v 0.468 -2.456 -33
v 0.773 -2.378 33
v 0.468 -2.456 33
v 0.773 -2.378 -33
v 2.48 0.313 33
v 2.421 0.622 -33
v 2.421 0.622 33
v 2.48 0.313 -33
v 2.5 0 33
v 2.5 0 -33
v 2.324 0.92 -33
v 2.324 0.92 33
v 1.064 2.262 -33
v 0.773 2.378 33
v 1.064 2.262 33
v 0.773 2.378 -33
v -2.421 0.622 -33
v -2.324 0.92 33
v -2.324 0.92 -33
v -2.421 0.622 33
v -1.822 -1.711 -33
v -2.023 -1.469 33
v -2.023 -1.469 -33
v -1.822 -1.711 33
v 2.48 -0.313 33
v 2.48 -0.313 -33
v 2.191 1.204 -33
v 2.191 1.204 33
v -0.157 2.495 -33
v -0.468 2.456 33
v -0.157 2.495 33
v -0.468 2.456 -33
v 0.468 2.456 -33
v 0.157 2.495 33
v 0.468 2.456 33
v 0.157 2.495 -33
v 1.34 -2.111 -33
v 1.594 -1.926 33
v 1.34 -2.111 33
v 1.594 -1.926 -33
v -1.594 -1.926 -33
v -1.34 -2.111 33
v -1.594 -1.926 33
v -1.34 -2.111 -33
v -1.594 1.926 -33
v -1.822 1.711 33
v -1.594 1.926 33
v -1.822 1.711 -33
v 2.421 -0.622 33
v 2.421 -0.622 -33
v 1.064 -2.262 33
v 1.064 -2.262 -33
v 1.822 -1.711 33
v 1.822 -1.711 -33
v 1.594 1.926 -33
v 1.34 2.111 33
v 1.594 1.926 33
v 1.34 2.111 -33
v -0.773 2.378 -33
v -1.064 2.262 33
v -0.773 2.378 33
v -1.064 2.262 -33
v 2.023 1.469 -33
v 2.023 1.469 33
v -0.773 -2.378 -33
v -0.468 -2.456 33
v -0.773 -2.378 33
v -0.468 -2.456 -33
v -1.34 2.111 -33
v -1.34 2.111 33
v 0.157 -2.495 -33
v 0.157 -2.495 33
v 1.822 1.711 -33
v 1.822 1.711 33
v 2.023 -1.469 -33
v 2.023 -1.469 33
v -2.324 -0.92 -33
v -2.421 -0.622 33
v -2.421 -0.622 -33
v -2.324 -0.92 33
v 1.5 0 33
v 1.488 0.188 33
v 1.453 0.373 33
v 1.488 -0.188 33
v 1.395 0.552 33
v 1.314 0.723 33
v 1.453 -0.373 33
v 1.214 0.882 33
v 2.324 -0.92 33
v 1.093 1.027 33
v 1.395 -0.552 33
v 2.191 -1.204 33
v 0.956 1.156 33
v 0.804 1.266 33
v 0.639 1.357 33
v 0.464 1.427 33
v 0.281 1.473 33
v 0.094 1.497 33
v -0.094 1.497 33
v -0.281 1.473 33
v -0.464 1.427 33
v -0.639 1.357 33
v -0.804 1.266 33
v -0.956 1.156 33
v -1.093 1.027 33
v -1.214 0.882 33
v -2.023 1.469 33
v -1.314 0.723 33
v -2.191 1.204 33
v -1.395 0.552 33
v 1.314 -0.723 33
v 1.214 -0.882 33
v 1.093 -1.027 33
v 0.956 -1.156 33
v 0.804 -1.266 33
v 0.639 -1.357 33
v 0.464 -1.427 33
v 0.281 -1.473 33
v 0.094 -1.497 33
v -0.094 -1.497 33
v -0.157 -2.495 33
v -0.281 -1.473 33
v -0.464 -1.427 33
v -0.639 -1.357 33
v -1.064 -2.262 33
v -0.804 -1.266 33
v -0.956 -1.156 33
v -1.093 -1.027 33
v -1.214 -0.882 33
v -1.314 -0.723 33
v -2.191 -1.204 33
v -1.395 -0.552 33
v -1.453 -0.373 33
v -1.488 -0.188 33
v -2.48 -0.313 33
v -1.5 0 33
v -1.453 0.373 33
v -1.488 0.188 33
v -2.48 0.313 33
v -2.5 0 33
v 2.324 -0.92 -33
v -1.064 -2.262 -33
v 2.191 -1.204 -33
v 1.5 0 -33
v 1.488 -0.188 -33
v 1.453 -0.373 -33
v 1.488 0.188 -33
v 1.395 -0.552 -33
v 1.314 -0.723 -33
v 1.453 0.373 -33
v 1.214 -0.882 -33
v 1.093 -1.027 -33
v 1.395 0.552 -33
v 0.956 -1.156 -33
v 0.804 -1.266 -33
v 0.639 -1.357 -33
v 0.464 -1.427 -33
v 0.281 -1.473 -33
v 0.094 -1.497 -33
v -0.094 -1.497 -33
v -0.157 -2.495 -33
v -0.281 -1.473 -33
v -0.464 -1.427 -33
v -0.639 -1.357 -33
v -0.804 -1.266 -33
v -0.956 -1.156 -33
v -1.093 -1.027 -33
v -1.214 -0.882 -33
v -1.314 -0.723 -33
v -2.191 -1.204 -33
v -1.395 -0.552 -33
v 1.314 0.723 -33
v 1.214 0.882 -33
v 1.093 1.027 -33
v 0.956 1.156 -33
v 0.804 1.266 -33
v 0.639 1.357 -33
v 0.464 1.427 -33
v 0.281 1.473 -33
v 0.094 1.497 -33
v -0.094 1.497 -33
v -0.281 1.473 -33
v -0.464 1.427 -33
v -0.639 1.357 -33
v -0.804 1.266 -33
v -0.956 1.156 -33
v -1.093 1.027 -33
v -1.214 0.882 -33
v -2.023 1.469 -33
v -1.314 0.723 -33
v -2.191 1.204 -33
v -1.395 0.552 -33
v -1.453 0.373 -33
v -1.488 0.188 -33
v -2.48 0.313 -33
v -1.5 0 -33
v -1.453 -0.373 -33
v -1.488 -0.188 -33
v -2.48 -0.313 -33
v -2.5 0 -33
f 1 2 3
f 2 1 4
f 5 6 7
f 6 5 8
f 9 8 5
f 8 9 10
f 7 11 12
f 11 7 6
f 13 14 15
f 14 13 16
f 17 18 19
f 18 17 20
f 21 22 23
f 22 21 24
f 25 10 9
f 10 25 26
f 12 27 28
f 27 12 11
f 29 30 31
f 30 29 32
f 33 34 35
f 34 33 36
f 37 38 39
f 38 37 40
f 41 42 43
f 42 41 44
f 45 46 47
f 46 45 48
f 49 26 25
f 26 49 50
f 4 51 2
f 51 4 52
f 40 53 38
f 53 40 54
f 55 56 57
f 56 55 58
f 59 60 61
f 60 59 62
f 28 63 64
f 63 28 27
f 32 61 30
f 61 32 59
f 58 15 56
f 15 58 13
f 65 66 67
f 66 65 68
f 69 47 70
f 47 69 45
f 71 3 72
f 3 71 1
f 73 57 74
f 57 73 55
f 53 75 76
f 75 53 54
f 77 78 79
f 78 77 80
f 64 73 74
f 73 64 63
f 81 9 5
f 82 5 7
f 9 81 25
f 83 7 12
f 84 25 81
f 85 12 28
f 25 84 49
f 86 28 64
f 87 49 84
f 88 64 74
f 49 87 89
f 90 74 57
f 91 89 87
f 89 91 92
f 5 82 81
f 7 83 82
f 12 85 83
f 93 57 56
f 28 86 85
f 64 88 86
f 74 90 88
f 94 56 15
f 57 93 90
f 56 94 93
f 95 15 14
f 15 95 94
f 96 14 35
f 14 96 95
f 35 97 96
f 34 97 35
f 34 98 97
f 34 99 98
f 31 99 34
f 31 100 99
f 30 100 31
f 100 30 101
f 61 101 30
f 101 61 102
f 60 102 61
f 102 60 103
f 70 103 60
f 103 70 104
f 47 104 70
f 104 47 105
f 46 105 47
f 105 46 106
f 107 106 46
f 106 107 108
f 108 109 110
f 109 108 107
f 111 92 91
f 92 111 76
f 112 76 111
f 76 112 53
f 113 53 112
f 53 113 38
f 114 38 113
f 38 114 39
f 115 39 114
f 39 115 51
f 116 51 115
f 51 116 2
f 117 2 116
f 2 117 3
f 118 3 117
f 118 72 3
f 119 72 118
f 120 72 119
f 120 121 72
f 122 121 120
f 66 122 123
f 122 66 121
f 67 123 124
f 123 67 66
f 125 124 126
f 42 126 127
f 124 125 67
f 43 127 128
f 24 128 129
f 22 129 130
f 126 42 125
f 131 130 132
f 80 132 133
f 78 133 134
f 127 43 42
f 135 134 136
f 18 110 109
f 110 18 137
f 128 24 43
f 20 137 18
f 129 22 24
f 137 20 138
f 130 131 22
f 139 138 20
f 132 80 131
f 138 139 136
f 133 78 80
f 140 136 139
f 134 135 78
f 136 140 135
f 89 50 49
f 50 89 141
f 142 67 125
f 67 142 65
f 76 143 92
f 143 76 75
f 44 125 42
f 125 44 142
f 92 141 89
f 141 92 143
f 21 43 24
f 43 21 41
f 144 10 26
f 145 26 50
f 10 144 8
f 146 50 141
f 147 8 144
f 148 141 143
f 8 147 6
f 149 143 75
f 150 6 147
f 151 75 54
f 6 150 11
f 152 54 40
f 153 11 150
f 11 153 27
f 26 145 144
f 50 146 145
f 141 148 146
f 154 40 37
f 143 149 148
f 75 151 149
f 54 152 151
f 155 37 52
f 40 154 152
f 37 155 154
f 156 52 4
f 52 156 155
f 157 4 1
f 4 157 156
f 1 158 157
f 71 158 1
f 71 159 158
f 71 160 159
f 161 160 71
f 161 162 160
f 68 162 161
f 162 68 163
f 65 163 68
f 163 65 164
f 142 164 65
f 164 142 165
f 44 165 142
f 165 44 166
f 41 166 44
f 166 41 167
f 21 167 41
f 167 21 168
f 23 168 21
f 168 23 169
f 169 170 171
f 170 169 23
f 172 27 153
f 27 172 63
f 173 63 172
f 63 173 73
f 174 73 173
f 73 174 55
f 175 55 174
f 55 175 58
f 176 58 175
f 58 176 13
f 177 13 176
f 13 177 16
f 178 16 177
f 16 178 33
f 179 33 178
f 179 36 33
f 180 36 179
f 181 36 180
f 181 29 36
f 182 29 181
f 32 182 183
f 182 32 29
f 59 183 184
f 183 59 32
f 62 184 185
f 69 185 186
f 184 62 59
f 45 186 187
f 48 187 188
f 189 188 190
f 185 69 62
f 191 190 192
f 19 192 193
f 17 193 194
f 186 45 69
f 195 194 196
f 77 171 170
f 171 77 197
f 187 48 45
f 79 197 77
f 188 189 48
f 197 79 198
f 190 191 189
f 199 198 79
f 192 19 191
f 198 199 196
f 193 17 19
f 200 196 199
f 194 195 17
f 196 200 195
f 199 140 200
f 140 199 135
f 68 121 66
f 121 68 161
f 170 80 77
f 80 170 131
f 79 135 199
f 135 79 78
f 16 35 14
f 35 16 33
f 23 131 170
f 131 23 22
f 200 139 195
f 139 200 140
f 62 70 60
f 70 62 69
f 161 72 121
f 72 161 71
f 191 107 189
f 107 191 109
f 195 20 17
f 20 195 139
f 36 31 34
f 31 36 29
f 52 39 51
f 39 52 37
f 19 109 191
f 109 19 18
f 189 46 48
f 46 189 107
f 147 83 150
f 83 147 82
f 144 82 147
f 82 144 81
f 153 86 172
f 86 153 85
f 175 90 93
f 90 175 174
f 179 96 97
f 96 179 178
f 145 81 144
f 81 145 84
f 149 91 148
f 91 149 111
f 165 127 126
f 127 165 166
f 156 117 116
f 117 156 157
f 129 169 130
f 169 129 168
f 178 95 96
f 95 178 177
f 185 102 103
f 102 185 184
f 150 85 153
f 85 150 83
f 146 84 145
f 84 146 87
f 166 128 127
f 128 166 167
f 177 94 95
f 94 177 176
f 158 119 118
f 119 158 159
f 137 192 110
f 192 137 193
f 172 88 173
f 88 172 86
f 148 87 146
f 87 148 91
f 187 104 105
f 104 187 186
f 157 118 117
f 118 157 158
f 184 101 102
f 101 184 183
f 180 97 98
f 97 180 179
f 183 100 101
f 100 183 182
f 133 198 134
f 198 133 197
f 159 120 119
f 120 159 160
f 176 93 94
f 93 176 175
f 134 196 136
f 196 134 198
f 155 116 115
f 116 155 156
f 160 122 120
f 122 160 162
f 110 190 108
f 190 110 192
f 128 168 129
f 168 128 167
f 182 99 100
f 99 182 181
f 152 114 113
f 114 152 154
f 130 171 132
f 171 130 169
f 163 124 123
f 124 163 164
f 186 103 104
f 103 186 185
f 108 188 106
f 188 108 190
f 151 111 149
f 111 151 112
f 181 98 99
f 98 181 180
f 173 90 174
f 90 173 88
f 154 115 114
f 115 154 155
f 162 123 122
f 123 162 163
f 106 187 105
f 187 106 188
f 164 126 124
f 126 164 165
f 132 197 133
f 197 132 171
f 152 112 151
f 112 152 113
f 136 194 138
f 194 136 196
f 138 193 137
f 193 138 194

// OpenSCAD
$fn = 50;


difference() {
	union() {
		translate(v = [0, 0, -33.0000000000]) {
			cylinder(h = 66, r = 2.5000000000);
		}
	}
	union() {
		translate(v = [0, 0, -100.0000000000]) {
			cylinder(h = 200, r = 1.5000000000);
		}
	}
}
